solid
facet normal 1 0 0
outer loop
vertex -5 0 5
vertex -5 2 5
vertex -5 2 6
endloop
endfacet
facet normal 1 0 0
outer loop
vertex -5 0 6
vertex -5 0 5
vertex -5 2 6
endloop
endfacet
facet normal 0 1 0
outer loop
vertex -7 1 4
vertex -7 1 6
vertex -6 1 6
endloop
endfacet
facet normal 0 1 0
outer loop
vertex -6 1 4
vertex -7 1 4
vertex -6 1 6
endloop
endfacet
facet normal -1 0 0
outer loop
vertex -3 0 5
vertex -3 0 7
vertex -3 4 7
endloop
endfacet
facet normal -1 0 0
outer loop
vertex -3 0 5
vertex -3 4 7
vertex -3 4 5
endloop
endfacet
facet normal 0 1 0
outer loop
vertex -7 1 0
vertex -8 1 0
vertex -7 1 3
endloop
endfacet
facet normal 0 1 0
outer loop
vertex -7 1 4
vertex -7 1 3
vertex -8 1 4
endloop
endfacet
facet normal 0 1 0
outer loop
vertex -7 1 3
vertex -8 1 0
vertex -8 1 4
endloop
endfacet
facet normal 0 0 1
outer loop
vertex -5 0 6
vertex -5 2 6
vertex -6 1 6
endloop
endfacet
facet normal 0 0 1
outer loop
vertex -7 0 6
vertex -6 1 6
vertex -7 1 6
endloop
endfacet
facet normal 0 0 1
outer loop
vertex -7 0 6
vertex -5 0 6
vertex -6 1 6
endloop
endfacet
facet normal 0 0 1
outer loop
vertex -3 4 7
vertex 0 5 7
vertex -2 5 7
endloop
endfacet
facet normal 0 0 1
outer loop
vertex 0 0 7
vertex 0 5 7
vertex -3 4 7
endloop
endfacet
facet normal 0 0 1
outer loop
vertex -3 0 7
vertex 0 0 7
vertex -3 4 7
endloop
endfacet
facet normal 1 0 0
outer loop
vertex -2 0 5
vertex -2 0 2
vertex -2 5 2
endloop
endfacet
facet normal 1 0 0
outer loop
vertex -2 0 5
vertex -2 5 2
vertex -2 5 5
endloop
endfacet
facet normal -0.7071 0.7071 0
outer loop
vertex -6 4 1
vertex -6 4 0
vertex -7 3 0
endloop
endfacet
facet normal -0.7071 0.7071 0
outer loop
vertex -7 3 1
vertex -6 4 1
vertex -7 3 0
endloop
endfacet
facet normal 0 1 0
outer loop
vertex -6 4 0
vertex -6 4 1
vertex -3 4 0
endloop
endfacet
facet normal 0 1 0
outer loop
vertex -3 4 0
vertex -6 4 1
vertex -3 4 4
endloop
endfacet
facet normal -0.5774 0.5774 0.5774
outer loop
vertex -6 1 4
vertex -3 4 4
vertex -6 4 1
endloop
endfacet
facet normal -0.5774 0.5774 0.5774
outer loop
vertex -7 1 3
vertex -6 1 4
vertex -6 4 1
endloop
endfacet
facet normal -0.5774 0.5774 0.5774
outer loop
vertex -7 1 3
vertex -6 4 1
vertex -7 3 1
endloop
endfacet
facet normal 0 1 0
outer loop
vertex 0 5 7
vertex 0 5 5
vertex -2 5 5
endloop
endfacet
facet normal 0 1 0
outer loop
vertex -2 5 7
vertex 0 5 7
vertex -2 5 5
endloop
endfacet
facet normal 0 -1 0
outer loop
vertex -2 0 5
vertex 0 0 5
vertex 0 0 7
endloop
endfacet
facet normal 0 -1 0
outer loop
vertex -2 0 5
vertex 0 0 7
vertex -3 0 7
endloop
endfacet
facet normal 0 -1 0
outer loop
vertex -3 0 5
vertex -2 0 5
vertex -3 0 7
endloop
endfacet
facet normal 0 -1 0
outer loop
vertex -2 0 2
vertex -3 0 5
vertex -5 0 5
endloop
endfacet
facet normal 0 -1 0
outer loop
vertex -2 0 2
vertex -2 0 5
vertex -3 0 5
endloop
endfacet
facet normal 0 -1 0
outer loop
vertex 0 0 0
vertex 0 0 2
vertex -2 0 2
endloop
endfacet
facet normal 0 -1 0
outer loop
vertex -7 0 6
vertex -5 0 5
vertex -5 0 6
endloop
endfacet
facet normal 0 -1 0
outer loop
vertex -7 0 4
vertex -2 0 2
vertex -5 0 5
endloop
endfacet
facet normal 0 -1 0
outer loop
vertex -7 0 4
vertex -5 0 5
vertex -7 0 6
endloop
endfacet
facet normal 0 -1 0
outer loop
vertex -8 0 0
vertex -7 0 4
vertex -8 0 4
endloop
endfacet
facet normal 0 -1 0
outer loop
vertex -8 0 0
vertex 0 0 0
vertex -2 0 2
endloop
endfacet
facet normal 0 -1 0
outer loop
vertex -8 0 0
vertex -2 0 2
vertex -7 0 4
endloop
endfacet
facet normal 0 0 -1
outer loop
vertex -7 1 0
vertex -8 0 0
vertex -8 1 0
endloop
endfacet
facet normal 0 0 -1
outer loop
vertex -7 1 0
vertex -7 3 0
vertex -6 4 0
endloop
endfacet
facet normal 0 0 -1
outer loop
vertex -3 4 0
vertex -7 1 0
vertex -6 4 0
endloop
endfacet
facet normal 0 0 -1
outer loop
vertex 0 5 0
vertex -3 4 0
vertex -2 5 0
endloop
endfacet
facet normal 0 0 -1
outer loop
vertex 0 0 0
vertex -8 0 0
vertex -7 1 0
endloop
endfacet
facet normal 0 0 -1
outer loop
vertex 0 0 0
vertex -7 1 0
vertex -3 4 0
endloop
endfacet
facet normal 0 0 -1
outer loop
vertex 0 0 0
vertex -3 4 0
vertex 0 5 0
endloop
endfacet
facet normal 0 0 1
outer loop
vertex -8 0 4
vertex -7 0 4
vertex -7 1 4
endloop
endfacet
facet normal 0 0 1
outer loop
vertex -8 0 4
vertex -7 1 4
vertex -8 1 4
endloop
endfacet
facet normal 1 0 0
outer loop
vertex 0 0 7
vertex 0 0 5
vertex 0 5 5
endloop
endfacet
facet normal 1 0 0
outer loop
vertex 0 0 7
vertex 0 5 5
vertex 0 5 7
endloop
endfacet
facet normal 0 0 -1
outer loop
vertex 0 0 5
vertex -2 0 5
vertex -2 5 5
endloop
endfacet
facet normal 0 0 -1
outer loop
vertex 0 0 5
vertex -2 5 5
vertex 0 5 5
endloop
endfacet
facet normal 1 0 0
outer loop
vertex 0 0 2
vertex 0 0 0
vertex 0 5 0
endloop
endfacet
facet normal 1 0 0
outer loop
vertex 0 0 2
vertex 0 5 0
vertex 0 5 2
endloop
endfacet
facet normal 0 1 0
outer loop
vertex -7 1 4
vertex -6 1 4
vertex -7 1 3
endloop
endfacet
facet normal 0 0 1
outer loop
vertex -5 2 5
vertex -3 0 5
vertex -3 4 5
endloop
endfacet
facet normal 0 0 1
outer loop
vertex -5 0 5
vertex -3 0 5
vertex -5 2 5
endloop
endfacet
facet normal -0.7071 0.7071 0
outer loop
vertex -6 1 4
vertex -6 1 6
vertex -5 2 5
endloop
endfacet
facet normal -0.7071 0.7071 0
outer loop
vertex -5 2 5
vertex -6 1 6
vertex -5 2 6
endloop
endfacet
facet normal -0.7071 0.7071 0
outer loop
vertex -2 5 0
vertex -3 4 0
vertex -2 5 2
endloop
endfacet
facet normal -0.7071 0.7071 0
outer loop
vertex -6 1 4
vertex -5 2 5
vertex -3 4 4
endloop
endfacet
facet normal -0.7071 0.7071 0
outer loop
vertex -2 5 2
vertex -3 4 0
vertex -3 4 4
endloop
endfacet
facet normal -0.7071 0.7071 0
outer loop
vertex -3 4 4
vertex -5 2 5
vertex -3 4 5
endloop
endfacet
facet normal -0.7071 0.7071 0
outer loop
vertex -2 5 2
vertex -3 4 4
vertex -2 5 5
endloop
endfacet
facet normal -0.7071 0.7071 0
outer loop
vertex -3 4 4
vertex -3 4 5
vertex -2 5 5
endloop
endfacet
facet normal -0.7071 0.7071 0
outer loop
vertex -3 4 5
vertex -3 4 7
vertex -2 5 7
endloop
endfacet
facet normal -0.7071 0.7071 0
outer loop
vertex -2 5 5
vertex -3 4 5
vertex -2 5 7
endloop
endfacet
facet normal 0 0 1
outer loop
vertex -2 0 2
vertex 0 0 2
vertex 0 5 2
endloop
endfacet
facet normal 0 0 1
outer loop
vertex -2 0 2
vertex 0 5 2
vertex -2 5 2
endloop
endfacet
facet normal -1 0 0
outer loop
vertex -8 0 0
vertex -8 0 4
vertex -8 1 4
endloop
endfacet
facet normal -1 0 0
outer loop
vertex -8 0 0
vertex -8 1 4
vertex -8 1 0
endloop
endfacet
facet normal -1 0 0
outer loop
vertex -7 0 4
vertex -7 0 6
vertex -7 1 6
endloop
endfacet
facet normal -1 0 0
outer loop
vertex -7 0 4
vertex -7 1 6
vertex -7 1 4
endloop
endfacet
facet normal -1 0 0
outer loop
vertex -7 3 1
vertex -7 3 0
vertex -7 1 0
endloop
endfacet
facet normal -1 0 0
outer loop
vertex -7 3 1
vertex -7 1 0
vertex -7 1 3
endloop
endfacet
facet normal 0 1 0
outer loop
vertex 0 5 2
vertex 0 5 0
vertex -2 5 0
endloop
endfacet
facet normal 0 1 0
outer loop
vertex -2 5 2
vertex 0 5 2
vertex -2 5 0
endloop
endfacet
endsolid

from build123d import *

# Parameters (mm, degrees)
BOSS_EXTRUDE1_DEPTH     = 5
CUT_EXTRUDE1_DEPTH      = 5
CUT_EXTRUDE1_DEPTH_BACK = 2
CUT_EXTRUDE3_DEPTH      = 5
SKETCH5_W               = 4
SKETCH5_H               = 3
CUT_EXTRUDE4_DEPTH      = 1
CUT_EXTRUDE5_DEPTH      = 1
CUT_EXTRUDE6_DEPTH      = 1


with BuildPart() as part:
    # Sketch1 → Boss-Extrude1 (new body)
    with BuildSketch(Plane(origin=(0, 0, 0), x_dir=(1, 0, 0), z_dir=(0, 1, 0))):
        Polygon((0, 0), (0, -2), (-2, -2), (-2, -5), (0, -5), (0, -7), (-3, -7), (-3, -5), (-5, -5), (-5, -6), (-7, -6), (-7, -4), (-8, -4), (-8, 0), align=None)
    extrude(amount=BOSS_EXTRUDE1_DEPTH)

    # Sketch2 → Cut-Extrude1 (cut, two sides)
    with BuildSketch(Plane.XY.offset(6)) as cut_extrude1_sk:
        Polygon((-8, 1), (-6, 1), (-2, 5), (-8, 5), align=None)
    extrude(amount=CUT_EXTRUDE1_DEPTH, mode=Mode.SUBTRACT)
    extrude(cut_extrude1_sk.sketch, amount=-CUT_EXTRUDE1_DEPTH_BACK, mode=Mode.SUBTRACT)

    # Sketch3 → Cut-Extrude3 (cut)
    with BuildSketch(Plane.XY.offset(4)):
        Polygon((-2, 5), (-3, 5), (-8, 5), (-8, 4), (-3, 4), align=None)
    extrude(amount=-CUT_EXTRUDE3_DEPTH, mode=Mode.SUBTRACT)

    # Sketch5 → Cut-Extrude4 (cut)
    with BuildSketch(Plane.ZY.offset(8)):
        with Locations((2, 2.5)):
            Rectangle(SKETCH5_W, SKETCH5_H)
    extrude(amount=-CUT_EXTRUDE4_DEPTH, mode=Mode.SUBTRACT)

    # Sketch7 → Cut-Extrude5 (cut)
    with BuildSketch(Plane(origin=(0, 0, 0), x_dir=(-1, 0, 0), z_dir=(0, 0, -1))):
        Polygon((6, 4), (7, 3), (7, 4), align=None)
    extrude(amount=-CUT_EXTRUDE5_DEPTH, mode=Mode.SUBTRACT)

    # 3DSketch1 → Cut-Extrude6 (cut, along a direction that is not the sketch's normal)
    with BuildSketch(Plane(origin=(-7, 1, 3), x_dir=(0.7844645405527364, 0.588348405414552, 0.19611613513818382), z_dir=(-0.5773502691896255, 0.577350269189626, 0.5773502691896261))):
        Polygon((0, 0), (0.784464541, 2.717464882), (2.157277487, 3.057147992), (5.099019514, 0), (0.980580676, -1.019049331), align=None)
    extrude(amount=CUT_EXTRUDE6_DEPTH, dir=(-1, 0, 0), mode=Mode.SUBTRACT)


with BuildPart() as body_2:
    # of the pieces the cut leaves, the one that is kept (cut_extrude6_keep)
    add(part.part.solids().sort_by_distance((0, 0, 0))[0])


solid = body_2.part
